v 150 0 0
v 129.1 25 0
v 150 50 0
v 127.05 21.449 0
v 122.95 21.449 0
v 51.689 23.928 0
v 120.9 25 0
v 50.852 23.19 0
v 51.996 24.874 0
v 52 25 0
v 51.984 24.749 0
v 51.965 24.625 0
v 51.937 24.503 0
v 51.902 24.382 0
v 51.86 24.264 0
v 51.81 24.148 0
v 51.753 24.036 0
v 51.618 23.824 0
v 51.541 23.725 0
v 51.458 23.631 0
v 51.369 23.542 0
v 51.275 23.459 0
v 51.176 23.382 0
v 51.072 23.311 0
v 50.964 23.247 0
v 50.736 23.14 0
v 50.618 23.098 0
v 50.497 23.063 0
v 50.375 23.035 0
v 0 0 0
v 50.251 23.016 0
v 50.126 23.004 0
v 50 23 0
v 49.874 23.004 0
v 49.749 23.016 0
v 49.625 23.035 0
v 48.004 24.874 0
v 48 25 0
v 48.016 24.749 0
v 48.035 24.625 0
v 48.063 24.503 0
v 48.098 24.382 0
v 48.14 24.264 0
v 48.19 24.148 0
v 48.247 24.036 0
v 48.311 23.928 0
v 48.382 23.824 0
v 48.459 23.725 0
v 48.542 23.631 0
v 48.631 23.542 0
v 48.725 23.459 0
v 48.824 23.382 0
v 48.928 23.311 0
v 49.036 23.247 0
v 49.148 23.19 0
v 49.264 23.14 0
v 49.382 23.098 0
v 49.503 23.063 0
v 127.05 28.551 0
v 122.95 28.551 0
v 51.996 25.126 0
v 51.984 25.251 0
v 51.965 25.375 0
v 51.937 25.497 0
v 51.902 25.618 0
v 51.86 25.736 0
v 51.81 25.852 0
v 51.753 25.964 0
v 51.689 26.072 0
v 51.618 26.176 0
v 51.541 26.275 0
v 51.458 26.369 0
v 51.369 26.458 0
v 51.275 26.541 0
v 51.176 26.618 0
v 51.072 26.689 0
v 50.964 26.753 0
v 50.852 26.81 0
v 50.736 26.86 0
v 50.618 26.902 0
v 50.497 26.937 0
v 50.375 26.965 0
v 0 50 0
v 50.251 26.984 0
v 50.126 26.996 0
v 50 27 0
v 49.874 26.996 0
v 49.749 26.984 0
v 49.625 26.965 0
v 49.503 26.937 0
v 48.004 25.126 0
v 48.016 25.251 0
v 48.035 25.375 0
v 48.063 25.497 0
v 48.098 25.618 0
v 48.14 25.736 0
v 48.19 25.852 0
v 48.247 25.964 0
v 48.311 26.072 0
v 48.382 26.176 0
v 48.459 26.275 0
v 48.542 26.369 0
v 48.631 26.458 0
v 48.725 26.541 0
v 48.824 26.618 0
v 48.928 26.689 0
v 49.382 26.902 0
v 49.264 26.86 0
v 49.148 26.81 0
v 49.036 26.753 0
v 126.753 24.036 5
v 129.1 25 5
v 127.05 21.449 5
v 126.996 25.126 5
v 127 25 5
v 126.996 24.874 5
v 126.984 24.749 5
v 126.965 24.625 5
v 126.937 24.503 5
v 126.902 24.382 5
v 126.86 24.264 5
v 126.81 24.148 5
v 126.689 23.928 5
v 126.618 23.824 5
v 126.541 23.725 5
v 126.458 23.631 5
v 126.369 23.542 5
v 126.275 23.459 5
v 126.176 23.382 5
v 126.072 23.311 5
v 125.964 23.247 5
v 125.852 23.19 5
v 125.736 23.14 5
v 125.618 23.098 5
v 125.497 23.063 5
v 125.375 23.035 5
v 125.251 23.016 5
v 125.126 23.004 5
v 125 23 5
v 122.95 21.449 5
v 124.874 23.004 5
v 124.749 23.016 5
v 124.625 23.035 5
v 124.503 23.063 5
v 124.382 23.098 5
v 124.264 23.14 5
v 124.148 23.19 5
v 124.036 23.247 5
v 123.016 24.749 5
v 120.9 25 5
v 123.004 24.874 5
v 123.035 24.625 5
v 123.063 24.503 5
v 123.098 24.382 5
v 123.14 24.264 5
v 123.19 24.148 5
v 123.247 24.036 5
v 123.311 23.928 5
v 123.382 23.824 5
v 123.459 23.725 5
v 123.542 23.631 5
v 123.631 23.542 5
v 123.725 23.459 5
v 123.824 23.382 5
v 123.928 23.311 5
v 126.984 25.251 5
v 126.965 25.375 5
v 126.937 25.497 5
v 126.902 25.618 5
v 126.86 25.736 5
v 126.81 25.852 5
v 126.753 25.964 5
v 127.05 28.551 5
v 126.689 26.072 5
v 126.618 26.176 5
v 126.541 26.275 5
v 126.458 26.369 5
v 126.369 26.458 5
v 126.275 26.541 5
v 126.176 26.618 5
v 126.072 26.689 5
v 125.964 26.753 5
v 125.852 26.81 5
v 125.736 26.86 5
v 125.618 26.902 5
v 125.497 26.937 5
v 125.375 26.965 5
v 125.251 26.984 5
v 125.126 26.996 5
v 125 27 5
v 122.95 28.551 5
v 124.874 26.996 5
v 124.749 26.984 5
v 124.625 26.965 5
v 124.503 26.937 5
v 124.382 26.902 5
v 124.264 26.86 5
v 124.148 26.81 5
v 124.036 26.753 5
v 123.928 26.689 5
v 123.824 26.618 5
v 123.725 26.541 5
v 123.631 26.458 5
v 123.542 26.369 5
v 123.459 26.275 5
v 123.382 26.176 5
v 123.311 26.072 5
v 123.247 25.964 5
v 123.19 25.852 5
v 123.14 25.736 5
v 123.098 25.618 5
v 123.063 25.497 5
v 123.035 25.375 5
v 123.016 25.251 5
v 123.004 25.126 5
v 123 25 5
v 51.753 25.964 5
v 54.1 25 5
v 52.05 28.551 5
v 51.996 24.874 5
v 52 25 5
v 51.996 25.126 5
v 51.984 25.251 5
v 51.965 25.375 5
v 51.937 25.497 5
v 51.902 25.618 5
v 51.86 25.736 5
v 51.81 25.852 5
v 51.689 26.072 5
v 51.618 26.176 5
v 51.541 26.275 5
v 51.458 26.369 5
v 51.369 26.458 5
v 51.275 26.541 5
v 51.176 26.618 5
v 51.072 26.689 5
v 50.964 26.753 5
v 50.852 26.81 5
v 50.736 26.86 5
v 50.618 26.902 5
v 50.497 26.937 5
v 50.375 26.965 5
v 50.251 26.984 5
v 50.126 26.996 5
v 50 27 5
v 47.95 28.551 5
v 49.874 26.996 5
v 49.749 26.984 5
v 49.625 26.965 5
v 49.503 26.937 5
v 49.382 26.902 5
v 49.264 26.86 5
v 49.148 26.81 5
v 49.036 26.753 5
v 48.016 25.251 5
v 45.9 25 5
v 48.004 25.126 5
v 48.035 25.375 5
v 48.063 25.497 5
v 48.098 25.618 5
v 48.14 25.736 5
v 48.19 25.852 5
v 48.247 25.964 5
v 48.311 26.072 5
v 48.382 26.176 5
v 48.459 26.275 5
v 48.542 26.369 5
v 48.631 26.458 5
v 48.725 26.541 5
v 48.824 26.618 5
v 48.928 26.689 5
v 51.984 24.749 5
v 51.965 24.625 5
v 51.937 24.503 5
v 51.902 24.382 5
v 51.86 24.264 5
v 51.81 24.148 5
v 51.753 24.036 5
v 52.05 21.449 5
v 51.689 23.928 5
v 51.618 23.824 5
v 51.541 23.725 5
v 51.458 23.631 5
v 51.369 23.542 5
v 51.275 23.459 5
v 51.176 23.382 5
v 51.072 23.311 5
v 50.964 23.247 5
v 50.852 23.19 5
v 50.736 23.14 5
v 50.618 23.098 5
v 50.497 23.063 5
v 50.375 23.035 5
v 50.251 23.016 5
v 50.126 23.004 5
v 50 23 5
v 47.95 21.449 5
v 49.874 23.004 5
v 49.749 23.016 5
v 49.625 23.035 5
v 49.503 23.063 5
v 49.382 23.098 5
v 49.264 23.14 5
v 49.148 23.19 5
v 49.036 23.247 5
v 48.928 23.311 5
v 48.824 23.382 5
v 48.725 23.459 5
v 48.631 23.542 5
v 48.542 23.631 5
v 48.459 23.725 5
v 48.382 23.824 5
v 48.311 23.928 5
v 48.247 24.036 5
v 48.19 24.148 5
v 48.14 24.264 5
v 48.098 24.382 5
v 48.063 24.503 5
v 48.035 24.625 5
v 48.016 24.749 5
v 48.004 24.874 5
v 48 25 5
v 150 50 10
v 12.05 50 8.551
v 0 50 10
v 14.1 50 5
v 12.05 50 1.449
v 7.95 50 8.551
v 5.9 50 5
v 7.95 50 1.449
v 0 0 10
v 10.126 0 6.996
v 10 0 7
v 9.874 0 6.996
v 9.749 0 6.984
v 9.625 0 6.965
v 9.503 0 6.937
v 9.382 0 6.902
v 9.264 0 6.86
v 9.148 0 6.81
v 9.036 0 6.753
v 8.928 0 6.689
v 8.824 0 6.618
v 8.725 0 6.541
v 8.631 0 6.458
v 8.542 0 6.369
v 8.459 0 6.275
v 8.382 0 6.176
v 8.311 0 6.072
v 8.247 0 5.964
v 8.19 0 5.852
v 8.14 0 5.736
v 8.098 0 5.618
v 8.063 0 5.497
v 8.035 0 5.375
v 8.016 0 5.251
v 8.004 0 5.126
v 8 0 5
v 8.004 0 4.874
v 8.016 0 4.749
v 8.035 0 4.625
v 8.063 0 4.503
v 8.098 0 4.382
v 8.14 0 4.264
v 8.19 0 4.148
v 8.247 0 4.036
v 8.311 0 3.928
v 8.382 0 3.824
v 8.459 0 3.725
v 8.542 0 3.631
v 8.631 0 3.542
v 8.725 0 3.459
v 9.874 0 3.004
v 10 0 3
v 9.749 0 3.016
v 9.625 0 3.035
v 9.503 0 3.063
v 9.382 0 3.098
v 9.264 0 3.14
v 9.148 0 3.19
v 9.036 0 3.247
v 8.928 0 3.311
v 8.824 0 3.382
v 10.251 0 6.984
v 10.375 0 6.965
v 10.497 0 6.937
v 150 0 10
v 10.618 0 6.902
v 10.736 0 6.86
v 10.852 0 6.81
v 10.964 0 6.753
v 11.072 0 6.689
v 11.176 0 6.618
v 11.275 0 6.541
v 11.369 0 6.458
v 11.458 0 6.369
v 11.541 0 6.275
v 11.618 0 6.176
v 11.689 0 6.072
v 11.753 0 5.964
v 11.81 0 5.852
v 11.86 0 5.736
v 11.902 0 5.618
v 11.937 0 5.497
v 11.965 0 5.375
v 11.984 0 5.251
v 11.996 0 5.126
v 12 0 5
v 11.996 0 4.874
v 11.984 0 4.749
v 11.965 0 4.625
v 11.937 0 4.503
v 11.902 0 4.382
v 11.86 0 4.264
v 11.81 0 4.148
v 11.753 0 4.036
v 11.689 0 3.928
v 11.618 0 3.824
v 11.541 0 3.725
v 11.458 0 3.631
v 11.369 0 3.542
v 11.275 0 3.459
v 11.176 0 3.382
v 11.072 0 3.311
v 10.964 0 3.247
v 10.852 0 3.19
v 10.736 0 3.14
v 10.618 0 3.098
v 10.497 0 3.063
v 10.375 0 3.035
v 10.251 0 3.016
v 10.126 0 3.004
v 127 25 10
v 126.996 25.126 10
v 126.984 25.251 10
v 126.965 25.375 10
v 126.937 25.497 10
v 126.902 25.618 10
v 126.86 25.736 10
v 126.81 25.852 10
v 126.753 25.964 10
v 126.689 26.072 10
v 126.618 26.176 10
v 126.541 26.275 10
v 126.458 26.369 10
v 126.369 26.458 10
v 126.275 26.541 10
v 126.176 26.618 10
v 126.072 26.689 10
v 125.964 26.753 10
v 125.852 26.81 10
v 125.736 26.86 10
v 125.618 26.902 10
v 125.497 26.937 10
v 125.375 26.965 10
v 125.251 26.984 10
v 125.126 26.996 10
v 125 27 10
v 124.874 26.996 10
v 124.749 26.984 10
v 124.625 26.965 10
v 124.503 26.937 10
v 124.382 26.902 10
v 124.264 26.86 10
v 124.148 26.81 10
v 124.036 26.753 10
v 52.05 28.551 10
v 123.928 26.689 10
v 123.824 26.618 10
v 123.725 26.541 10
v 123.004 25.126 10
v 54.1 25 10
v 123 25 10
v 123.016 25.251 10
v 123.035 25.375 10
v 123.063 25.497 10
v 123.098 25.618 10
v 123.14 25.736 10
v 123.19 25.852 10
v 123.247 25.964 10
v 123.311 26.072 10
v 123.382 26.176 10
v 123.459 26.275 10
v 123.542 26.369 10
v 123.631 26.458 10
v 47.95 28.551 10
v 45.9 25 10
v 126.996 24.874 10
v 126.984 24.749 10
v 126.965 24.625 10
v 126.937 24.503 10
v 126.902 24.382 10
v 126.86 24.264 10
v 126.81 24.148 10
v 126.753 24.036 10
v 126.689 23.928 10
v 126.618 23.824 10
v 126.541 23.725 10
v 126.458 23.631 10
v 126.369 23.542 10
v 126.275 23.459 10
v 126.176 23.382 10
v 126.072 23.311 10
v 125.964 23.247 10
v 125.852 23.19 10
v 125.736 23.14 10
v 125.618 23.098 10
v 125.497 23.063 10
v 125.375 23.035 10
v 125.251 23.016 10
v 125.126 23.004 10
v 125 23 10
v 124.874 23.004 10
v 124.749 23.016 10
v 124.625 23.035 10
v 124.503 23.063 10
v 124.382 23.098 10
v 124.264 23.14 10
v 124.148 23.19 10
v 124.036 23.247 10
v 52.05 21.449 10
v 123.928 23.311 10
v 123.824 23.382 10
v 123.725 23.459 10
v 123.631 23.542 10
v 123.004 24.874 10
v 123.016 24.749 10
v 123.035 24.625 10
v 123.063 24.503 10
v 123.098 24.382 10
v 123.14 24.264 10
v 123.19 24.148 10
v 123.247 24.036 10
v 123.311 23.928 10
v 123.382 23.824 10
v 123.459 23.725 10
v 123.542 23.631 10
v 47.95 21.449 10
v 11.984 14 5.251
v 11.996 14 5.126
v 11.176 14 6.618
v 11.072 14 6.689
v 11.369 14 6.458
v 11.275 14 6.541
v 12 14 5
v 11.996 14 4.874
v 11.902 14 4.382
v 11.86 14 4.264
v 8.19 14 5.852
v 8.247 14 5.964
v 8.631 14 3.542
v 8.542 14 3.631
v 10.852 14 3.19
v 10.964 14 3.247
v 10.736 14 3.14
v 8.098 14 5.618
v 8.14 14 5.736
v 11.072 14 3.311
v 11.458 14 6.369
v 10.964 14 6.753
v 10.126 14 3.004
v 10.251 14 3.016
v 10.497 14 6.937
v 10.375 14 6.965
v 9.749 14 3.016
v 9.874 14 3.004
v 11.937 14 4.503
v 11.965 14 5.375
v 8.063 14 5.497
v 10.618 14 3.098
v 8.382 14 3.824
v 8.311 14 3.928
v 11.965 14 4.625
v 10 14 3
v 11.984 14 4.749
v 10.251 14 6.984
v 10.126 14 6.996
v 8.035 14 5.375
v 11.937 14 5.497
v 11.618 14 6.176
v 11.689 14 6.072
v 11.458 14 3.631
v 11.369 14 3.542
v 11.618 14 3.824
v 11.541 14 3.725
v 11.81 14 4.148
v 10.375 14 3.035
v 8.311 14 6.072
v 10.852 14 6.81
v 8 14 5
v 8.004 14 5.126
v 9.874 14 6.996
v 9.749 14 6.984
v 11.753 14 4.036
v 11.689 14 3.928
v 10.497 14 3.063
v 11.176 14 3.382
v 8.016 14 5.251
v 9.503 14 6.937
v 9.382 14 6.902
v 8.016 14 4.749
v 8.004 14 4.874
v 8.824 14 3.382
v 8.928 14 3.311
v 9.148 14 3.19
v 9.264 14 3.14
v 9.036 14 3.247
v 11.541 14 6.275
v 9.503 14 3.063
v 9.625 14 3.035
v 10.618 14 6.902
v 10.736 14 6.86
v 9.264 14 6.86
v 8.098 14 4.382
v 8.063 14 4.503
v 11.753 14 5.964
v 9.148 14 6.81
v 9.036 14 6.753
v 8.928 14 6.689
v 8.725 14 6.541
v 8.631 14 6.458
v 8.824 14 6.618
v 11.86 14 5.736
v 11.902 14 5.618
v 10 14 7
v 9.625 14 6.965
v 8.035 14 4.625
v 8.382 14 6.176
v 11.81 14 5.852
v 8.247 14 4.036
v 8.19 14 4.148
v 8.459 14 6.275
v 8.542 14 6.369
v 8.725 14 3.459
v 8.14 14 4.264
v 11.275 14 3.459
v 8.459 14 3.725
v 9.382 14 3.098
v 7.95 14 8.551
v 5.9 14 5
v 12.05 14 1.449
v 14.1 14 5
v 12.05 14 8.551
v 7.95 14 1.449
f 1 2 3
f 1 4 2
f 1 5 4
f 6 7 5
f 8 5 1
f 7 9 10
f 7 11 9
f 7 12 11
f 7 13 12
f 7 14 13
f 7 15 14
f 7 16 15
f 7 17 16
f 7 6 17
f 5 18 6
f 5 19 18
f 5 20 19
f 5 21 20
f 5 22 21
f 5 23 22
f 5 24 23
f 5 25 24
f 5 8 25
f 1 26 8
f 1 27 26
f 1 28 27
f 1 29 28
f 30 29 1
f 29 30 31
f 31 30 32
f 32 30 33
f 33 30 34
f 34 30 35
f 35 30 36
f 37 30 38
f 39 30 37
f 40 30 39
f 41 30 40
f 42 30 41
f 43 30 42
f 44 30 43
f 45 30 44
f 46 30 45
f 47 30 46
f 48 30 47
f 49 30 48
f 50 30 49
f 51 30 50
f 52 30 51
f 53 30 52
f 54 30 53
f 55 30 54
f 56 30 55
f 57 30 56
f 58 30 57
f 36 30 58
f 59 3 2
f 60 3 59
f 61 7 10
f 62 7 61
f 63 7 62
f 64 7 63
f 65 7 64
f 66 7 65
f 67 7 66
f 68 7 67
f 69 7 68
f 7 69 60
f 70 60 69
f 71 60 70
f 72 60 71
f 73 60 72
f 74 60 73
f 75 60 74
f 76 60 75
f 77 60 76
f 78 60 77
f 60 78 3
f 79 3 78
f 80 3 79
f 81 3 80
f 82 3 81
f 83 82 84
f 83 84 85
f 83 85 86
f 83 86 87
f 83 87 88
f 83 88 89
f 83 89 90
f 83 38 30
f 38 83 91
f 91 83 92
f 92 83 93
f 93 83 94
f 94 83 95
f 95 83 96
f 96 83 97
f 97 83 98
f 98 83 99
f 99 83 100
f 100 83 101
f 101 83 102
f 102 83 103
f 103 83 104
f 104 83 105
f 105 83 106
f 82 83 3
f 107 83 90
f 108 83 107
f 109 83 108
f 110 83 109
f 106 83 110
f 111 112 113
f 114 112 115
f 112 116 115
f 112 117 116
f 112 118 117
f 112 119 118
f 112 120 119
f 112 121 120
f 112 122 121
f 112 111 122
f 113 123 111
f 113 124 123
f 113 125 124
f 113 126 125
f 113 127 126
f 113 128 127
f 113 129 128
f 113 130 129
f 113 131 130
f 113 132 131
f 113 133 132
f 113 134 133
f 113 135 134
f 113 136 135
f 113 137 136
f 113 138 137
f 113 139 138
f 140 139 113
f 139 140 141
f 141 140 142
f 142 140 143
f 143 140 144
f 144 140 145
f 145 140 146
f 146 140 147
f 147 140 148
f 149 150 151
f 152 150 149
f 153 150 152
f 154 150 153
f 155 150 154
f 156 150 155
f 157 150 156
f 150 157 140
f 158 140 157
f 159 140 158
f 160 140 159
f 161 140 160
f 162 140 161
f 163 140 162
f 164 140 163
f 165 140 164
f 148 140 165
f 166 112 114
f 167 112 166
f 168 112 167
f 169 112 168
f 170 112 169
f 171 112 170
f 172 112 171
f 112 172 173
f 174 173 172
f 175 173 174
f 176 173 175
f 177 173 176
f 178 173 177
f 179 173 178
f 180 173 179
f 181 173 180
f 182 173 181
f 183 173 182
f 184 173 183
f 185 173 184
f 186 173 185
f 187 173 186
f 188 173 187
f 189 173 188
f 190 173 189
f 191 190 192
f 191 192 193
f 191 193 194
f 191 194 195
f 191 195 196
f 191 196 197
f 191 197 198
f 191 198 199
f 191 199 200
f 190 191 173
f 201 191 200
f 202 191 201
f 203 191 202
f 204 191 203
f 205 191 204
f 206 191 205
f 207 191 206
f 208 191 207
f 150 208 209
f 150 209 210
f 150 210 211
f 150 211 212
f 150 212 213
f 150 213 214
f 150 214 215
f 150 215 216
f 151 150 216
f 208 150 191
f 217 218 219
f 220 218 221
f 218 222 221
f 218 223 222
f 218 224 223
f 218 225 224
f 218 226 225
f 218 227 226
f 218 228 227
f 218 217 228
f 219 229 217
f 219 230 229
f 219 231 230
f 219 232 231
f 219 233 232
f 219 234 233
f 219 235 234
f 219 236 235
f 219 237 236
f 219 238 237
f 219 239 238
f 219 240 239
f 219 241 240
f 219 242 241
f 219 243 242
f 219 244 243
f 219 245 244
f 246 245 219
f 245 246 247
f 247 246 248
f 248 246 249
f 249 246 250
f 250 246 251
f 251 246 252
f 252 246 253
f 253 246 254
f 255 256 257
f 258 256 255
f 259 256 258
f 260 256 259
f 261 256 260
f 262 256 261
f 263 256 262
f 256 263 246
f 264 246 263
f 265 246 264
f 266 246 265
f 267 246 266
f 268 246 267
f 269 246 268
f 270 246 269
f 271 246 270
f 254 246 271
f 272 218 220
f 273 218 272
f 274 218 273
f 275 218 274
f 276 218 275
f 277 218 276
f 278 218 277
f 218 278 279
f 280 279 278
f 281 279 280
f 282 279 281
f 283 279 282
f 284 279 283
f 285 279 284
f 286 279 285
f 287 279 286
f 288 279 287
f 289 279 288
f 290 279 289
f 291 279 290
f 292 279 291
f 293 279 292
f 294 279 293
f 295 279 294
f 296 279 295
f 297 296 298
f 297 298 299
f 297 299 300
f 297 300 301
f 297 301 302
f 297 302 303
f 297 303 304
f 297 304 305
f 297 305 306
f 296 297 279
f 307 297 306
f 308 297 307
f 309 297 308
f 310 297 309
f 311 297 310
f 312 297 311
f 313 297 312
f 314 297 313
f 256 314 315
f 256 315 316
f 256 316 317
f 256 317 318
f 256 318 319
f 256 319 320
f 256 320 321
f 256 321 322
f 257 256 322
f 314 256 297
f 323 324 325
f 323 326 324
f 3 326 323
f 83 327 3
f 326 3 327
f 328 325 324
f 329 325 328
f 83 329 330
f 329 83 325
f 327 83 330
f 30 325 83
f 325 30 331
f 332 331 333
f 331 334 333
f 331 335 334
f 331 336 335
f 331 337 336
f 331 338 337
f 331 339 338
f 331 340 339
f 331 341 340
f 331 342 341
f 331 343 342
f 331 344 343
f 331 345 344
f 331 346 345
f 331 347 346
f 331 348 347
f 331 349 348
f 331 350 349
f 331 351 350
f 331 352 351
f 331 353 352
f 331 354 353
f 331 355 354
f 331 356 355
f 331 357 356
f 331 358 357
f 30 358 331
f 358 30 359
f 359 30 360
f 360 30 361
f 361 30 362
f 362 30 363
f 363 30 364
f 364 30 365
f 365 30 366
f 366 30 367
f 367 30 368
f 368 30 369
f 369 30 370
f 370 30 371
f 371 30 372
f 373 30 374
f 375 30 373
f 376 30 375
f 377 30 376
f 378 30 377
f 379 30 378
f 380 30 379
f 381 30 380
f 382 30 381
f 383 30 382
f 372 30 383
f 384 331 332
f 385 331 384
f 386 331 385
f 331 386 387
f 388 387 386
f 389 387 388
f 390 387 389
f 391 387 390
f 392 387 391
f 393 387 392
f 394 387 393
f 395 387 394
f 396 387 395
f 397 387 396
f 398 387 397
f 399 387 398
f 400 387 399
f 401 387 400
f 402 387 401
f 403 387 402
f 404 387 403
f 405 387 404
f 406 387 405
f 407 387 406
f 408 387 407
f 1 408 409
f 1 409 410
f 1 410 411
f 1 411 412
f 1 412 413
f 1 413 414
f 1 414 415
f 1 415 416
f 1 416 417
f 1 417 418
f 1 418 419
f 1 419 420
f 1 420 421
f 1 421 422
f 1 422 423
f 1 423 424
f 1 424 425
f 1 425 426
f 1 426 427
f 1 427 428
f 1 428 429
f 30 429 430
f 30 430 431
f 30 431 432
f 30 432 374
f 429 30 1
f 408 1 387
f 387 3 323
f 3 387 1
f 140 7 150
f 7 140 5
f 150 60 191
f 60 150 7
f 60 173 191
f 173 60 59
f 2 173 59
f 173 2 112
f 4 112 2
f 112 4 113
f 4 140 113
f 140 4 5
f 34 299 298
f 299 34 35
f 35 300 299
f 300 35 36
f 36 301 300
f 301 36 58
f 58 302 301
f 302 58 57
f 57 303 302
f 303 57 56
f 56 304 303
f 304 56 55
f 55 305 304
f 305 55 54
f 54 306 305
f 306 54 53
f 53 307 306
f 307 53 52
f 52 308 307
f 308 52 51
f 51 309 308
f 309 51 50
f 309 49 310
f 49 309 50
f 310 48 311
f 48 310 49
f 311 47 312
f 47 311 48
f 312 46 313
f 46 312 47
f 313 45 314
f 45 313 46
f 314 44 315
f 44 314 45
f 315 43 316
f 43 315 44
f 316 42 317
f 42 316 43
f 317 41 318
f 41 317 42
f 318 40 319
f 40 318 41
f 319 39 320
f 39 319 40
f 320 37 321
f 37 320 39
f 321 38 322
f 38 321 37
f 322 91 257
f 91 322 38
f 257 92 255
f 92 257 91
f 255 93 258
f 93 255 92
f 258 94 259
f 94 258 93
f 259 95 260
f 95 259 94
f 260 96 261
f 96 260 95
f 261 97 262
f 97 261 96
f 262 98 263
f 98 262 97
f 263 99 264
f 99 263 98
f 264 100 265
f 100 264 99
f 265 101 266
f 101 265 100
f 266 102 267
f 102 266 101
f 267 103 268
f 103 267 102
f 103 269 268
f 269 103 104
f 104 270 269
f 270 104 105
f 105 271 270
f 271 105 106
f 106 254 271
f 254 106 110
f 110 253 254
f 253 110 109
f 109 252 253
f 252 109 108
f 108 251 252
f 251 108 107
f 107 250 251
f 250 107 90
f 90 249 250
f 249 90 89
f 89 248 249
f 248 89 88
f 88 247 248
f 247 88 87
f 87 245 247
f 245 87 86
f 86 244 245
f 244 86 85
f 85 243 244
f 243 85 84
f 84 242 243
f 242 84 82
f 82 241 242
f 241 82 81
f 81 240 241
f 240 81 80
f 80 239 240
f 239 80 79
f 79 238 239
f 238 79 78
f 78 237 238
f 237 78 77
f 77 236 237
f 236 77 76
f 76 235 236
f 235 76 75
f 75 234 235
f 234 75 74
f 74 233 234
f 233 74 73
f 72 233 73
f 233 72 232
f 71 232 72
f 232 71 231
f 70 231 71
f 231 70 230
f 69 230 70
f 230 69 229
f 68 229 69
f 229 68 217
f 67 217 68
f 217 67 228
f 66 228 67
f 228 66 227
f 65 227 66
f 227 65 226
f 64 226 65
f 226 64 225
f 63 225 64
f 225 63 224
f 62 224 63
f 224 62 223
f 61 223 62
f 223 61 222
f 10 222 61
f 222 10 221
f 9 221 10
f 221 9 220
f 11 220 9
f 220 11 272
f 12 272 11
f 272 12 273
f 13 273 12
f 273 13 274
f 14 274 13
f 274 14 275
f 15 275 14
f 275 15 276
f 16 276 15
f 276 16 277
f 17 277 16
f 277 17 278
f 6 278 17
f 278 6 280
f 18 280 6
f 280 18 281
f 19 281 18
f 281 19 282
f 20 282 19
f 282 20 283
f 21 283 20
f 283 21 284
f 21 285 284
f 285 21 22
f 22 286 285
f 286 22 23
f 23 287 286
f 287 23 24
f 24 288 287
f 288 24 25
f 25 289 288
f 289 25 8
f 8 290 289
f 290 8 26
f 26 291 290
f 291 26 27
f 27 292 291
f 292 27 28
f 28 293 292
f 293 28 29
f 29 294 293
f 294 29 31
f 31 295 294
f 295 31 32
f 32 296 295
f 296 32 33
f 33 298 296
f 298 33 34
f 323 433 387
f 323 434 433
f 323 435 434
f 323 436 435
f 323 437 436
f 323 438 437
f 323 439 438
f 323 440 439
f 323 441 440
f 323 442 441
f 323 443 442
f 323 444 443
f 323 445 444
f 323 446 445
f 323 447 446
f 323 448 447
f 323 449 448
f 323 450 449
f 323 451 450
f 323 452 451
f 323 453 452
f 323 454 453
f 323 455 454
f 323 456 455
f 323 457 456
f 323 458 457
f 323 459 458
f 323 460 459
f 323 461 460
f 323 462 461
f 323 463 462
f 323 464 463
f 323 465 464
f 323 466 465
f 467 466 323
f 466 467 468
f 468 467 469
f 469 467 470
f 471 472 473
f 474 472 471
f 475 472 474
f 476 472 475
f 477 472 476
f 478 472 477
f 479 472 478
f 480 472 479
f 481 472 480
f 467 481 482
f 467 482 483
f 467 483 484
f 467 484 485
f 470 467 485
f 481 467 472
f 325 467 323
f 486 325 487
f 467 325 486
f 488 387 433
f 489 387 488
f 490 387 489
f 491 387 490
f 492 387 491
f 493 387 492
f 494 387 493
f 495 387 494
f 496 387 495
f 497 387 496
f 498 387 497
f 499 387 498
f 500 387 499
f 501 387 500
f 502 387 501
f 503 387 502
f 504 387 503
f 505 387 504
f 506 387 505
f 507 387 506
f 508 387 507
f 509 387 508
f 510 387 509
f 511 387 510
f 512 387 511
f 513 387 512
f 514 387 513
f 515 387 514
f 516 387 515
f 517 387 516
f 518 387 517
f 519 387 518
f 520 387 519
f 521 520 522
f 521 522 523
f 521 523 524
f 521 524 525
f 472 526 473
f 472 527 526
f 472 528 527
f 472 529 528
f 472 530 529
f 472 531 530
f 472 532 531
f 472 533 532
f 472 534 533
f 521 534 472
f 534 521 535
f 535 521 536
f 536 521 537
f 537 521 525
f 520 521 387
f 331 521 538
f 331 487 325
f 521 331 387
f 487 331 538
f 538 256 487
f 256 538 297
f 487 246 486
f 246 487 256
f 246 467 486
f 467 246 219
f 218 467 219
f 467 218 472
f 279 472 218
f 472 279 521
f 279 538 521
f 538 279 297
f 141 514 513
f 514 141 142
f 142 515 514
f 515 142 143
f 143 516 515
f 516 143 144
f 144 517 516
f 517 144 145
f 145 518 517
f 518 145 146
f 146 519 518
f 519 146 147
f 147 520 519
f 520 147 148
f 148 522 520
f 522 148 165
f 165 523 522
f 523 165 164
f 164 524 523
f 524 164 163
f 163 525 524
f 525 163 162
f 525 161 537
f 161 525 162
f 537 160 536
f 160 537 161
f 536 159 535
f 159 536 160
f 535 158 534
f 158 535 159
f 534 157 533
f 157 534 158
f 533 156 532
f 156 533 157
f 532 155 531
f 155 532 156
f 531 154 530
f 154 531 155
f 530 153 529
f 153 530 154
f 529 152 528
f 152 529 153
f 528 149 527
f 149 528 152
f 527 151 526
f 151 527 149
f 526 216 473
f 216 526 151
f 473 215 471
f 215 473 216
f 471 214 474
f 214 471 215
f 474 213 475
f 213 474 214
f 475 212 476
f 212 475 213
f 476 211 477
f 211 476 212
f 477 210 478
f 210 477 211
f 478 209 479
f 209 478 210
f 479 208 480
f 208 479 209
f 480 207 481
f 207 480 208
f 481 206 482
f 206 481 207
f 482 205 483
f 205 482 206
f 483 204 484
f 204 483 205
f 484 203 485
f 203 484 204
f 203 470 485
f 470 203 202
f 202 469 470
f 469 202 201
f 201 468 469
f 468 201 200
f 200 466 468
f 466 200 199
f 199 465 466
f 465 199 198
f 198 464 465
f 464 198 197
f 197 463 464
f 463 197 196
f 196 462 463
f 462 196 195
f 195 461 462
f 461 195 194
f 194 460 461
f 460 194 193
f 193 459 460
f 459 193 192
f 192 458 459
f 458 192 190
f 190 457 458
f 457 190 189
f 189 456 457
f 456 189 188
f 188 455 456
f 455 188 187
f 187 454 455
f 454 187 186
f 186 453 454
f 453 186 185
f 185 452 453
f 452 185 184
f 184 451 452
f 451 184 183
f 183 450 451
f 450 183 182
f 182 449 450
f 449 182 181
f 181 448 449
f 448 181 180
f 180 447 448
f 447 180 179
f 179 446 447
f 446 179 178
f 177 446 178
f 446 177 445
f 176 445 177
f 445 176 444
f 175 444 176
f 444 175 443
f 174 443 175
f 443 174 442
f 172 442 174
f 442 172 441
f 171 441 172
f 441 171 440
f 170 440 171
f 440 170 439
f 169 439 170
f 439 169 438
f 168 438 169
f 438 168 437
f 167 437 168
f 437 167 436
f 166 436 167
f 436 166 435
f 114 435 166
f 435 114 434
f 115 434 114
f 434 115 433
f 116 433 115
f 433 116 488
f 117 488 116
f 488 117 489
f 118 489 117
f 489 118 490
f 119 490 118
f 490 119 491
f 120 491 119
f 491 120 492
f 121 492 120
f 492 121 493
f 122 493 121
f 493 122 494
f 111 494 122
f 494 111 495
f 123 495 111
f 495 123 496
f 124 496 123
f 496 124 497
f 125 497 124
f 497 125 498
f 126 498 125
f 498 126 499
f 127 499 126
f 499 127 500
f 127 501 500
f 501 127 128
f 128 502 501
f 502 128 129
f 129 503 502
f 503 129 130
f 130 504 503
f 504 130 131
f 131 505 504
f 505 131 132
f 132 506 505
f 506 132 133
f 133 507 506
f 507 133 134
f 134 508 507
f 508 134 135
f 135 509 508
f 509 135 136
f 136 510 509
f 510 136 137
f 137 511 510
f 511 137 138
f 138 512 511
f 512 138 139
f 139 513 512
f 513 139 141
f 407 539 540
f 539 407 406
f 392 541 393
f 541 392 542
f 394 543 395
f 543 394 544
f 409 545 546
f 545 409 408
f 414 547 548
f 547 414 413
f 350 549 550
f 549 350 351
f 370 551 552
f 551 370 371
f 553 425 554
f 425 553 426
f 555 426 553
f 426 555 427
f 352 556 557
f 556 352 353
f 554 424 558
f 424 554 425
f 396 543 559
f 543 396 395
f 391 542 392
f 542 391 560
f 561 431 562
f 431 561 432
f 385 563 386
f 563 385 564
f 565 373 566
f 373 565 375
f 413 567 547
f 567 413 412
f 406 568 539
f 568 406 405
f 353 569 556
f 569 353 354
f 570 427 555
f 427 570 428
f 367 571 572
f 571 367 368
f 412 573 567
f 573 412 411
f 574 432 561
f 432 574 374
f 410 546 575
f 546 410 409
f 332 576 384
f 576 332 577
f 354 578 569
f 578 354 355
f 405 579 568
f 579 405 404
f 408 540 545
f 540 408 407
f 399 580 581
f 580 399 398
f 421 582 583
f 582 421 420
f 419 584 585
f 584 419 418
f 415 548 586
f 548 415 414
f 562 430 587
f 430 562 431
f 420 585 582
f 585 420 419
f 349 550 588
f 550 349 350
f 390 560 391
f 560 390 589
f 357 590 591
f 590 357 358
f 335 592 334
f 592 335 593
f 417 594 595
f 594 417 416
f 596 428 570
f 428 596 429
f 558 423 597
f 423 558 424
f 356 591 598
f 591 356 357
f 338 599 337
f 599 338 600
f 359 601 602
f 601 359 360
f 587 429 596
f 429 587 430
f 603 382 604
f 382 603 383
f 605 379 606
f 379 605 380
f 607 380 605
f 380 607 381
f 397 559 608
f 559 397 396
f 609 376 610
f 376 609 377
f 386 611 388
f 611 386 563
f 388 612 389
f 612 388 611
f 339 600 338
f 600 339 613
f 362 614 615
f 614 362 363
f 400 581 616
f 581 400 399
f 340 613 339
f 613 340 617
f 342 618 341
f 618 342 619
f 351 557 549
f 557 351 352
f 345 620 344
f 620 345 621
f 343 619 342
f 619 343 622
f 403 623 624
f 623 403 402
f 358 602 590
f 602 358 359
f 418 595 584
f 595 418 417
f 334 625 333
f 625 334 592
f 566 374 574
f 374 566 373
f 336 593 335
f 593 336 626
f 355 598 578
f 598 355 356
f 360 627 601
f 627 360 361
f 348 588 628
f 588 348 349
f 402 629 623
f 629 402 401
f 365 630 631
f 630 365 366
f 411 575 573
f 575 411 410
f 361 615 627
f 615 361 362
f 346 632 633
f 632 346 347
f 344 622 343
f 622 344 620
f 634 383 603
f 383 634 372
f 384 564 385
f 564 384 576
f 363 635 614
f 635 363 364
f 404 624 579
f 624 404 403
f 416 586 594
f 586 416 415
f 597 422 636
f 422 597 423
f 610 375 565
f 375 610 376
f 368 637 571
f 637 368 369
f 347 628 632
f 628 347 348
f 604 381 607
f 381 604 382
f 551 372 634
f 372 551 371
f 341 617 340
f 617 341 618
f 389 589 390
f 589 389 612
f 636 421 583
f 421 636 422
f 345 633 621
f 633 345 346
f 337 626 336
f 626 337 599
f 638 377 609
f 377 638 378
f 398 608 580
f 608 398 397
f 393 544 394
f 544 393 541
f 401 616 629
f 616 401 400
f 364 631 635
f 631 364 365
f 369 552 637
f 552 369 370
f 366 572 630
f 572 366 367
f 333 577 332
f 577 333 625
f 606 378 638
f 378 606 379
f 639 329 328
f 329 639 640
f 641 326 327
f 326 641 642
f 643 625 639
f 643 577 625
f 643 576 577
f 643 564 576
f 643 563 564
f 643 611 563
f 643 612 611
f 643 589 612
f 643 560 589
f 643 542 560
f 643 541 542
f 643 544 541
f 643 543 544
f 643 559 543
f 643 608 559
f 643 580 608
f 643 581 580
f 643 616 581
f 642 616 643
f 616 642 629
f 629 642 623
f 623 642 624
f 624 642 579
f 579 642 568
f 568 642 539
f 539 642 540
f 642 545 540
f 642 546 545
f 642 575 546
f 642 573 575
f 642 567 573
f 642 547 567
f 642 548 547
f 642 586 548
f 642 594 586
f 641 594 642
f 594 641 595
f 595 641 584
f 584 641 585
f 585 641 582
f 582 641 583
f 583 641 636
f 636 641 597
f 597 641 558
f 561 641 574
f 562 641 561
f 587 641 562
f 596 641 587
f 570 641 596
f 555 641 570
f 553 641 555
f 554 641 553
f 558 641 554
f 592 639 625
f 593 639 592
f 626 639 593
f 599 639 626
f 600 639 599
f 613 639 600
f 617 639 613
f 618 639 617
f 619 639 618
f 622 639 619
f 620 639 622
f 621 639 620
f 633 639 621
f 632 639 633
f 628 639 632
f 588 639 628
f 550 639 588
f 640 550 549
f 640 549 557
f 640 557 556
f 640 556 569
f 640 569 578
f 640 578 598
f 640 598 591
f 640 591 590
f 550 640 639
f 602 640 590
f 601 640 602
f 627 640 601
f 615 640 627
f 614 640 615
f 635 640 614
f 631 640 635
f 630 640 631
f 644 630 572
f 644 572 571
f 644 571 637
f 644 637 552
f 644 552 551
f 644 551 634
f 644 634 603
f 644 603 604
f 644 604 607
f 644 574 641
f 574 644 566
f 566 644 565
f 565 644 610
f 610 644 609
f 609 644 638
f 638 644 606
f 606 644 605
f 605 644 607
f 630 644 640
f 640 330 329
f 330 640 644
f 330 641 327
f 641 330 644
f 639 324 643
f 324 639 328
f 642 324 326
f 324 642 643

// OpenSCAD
BOARD_WIDTH = 150;
BOARD_DEPTH = 50;
LAYER_HEIGHT = 5;
FIRST_CHUNK = 50;
SECOND_CHUNK = FIRST_CHUNK + 75;

module main(){
  difference(){
    board_layers();
    horizontal_screws();
  }
}

module board_layers(){
  board_first_layer();
  
  translate([0, 0, LAYER_HEIGHT]){
    board_second_layer();    
  }  
}

module horizontal_screws(){
  SCREW_OFFSET = 5;
  SCREW_LENGTH = 15;
  SCREW_SIZE = SCREW_LENGTH + SCREW_OFFSET;
  NUT_LENGTH = BOARD_DEPTH - SCREW_LENGTH + SCREW_OFFSET;
  
  translate([10, SCREW_SIZE - SCREW_OFFSET, LAYER_HEIGHT]) {
    rotate([90,0,0]) {
      m4_6_screw_3d(SCREW_SIZE);

      translate([0, 0, -NUT_LENGTH + 1])
      m4_6_nut_3d(NUT_LENGTH);
    }
  }  
}


module board_first_layer(){
  linear_extrude(LAYER_HEIGHT){
    DEPTH_CENTER = BOARD_DEPTH / 2;

    difference(){
      board_base();

      translate([FIRST_CHUNK, DEPTH_CENTER, 0])
	m4_6_screw_2d();

      translate([SECOND_CHUNK, DEPTH_CENTER, 0])
	m4_6_nut_2d();
    }
  }  
}

module board_second_layer(){
  linear_extrude(LAYER_HEIGHT){
    DEPTH_CENTER = BOARD_DEPTH / 2;

    difference(){
      board_base();

      translate([FIRST_CHUNK, DEPTH_CENTER, 0])
	m4_6_nut_2d();

      translate([SECOND_CHUNK, DEPTH_CENTER, 0])
	m4_6_screw_2d();
    }
  }  
}

module board_layer(reverse){
}

module board_base(){
  square([BOARD_WIDTH, BOARD_DEPTH]);
}

module m4_6_screw_2d(){
  $fn = 100;
  circle(2);
}


module m4_6_screw_3d(length){
  linear_extrude(length)
    m4_6_screw_2d();
}

module m4_6_nut_2d(){
  $fn = 6;
  circle(4.1);
}
module m4_6_nut_3d(length){
  linear_extrude(length)
  m4_6_nut_2d();
}


main();
